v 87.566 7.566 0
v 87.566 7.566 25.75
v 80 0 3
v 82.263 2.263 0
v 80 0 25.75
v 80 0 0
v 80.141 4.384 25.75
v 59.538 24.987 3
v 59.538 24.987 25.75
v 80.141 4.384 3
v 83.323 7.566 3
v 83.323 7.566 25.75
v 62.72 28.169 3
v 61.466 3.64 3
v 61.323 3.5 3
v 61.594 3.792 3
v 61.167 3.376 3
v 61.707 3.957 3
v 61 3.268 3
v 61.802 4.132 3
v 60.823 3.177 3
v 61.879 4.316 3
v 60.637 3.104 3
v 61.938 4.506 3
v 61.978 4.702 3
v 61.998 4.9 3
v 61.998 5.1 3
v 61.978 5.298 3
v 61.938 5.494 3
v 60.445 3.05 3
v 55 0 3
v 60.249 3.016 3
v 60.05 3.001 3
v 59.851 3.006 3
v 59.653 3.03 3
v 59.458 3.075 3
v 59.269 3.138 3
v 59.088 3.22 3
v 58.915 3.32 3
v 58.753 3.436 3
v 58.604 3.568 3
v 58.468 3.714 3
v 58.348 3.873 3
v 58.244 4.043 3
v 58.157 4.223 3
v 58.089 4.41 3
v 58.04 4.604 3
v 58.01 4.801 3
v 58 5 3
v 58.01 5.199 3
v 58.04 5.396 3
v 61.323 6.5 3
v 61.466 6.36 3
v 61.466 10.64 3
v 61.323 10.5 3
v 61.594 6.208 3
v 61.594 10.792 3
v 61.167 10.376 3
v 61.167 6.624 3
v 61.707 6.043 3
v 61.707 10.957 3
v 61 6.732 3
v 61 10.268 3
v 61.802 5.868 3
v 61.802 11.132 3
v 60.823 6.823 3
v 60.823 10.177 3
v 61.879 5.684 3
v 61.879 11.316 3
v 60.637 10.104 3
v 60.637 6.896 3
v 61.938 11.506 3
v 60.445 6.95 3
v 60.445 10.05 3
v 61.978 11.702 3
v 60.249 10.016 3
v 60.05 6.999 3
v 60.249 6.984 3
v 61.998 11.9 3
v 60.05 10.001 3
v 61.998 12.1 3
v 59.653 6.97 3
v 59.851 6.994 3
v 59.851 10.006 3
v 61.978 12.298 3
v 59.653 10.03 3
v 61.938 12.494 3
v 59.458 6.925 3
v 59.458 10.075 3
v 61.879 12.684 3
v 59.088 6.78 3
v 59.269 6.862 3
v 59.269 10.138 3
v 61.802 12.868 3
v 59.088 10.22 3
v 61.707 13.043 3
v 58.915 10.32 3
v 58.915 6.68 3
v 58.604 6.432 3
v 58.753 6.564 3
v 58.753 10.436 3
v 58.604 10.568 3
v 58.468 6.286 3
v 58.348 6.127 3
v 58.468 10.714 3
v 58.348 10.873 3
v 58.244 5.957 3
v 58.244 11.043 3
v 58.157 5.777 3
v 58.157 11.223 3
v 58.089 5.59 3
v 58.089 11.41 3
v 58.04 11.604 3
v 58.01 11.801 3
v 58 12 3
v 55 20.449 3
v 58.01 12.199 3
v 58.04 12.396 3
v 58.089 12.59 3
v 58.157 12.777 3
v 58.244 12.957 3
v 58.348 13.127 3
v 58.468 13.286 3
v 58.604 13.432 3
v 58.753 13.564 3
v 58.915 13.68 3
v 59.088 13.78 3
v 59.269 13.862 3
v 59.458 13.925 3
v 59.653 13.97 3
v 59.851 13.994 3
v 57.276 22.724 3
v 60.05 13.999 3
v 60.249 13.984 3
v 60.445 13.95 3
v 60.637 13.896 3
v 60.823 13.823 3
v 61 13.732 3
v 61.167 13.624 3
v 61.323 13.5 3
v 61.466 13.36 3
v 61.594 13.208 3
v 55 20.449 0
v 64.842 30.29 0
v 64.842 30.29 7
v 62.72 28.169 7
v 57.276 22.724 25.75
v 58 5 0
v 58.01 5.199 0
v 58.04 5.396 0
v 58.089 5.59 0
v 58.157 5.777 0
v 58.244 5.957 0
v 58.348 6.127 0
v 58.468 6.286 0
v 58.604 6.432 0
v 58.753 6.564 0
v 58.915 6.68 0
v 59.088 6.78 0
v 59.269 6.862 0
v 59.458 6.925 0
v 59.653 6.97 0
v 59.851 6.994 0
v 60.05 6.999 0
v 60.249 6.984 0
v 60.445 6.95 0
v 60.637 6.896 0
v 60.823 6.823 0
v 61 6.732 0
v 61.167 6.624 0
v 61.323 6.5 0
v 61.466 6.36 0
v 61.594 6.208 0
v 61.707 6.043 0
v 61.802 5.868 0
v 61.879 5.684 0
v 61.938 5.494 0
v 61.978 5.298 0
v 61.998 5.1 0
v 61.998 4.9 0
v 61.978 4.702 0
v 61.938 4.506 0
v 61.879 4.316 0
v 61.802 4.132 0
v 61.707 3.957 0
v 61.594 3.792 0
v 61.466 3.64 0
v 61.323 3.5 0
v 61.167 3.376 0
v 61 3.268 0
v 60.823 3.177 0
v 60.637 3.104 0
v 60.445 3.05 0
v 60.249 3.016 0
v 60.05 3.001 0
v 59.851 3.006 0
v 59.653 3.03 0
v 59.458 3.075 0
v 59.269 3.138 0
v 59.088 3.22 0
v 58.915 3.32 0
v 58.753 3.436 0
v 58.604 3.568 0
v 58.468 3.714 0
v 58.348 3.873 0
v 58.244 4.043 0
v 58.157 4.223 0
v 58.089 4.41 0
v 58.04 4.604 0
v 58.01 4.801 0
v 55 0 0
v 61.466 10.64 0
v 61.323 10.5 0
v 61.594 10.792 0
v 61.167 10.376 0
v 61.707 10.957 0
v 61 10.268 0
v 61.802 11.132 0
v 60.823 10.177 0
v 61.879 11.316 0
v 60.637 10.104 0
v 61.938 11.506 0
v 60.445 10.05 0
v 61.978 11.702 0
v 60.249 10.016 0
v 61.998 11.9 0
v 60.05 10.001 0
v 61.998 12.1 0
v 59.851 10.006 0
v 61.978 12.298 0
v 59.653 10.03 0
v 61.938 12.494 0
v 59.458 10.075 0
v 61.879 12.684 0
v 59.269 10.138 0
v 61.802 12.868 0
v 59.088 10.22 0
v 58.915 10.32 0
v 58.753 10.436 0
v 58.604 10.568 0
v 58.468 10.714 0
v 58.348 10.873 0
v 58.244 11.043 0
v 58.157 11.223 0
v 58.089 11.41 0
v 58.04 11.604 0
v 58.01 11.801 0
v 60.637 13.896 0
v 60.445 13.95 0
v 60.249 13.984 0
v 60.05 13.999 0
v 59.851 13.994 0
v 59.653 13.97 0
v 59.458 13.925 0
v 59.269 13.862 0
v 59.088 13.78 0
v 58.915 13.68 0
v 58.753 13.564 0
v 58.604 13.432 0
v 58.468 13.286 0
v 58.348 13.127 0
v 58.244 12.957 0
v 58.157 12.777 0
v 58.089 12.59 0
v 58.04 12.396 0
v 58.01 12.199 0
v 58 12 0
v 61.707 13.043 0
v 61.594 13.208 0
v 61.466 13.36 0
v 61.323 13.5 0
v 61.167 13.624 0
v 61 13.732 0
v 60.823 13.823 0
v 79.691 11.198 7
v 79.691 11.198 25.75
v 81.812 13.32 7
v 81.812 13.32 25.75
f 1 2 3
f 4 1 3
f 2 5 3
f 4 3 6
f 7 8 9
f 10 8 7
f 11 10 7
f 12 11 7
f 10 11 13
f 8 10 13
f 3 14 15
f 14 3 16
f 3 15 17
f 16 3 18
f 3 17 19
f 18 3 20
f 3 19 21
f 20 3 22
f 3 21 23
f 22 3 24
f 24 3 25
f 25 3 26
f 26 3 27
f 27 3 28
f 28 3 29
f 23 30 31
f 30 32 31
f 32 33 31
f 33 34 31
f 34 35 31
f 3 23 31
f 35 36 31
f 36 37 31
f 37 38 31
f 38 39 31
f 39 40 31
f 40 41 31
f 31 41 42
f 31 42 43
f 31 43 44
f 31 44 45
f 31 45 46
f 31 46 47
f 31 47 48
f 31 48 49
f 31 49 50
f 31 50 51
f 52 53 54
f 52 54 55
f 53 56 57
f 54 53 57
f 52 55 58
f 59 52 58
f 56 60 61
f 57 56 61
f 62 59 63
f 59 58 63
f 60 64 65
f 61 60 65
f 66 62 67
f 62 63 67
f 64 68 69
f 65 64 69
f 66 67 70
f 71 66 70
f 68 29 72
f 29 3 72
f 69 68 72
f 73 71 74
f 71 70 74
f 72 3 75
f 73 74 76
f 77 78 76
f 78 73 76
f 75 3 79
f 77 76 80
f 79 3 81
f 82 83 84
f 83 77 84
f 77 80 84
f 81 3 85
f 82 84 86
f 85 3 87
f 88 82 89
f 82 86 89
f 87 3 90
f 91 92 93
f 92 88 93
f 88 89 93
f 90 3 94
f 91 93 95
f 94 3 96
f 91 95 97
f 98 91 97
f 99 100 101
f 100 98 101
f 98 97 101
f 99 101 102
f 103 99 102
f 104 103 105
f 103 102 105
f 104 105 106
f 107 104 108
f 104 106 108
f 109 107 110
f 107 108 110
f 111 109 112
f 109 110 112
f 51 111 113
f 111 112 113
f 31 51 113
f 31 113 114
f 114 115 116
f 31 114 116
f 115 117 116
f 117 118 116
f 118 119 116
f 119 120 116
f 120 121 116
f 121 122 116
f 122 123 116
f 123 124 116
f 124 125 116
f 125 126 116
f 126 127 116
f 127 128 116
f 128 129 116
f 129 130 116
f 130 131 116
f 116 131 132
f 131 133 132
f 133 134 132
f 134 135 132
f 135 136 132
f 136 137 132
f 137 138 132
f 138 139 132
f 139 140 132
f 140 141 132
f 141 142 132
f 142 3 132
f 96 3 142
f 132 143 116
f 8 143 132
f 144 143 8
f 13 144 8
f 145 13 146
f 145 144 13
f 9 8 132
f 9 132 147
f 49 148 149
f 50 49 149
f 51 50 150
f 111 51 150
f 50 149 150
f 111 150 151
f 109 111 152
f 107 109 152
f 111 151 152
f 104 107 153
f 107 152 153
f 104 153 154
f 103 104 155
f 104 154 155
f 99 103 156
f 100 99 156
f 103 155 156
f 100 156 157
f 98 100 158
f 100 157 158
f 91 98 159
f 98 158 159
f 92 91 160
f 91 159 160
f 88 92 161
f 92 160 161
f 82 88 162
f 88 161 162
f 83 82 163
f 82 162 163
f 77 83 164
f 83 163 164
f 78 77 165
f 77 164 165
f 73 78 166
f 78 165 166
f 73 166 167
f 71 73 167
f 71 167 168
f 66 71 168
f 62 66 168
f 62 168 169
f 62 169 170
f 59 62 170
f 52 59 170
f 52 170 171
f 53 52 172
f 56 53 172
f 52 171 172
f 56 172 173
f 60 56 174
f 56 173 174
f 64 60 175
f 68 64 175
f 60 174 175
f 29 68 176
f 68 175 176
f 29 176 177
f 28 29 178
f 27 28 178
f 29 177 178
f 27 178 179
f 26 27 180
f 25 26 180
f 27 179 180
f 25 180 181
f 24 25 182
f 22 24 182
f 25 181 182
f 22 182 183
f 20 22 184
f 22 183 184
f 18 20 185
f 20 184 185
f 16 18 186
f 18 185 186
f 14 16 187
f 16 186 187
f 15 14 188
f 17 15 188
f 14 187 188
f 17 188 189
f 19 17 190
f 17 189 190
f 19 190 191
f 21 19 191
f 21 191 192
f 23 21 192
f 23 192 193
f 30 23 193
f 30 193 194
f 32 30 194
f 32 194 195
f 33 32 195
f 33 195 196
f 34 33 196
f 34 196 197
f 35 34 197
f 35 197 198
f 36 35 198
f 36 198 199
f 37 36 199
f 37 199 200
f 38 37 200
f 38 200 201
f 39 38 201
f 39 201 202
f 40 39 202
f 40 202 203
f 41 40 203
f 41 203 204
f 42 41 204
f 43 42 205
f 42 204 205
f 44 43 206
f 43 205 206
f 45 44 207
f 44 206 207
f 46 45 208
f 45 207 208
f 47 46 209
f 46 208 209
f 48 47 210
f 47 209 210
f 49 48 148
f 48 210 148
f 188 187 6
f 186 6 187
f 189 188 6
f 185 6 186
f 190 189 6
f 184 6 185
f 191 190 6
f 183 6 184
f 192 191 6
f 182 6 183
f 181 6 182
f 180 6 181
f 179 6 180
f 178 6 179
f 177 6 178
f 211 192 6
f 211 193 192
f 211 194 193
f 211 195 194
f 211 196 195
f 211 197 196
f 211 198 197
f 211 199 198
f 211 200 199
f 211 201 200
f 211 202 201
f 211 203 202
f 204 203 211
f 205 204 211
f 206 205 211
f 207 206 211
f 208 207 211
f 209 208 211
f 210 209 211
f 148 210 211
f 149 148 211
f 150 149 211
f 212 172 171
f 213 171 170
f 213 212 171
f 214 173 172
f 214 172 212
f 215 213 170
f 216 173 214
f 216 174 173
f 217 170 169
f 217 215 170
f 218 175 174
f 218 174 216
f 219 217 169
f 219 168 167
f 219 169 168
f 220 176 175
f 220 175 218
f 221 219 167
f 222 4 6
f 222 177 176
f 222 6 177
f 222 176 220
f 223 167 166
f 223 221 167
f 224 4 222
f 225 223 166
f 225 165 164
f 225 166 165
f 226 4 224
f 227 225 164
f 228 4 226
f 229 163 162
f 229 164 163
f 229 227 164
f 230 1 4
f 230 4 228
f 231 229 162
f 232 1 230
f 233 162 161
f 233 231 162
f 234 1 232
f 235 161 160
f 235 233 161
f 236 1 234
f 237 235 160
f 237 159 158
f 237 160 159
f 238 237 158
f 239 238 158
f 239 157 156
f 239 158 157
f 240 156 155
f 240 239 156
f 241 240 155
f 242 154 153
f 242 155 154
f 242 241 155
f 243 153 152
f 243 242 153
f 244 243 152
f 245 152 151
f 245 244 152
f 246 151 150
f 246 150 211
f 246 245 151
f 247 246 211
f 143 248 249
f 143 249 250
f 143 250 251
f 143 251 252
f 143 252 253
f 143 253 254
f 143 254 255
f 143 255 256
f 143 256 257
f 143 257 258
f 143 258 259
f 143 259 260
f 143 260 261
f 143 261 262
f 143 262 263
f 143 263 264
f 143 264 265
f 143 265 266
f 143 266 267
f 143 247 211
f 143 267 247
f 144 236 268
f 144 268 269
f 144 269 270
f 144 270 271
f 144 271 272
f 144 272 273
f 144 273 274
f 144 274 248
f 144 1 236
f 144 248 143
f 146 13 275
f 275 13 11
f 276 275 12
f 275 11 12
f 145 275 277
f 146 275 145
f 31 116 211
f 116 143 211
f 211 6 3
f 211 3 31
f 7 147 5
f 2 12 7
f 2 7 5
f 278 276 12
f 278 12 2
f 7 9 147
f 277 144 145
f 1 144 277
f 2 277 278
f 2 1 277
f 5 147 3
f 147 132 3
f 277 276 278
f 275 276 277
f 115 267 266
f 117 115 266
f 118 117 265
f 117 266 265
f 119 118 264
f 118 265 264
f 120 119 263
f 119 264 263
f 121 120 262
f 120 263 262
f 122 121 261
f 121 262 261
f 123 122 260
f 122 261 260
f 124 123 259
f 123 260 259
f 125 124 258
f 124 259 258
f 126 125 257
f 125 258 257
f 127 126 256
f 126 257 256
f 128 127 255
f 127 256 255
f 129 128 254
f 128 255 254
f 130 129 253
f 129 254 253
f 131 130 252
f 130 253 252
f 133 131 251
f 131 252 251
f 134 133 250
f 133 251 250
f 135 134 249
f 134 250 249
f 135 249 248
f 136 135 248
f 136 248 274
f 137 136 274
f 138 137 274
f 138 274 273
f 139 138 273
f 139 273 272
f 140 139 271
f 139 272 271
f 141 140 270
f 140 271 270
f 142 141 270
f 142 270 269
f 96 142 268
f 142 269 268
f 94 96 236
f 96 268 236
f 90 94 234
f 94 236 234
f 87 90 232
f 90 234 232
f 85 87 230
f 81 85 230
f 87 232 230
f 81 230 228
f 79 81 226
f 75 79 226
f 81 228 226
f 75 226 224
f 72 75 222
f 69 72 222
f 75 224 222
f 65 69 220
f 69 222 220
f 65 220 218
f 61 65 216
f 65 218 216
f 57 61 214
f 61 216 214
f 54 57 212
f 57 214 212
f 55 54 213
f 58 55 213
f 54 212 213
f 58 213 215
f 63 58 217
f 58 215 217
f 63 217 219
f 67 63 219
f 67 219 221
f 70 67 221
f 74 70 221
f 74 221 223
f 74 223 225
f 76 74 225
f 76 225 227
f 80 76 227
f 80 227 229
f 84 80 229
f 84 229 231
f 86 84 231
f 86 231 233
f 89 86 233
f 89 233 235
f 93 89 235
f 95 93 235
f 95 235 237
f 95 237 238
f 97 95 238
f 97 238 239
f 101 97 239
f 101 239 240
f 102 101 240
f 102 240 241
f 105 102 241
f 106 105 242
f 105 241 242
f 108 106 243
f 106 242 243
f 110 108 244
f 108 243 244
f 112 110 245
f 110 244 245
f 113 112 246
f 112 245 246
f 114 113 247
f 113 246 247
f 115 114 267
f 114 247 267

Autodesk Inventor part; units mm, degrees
ref_plane "YZ Plane" through (0, 0, 0) normal (1, 0, 0) x (0, 1, 0)
ref_plane "XZ Plane" through (0, 0, 0) normal (0, 1, 0) x (-1, 0, 0)
ref_plane "XY Plane" through (0, 0, 0) normal (0, 0, 1) x (1, 0, 0)
sketch "Эскиз1" plane through (0, 0, 0) normal (0, 0, 1) x (1, 0, 0)
  line L0 (0, 80) -> (80, 0)
  line L1 (2.2627, 82.2627) -> (82.2627, 2.2627)
  line L2 (0, 80) -> (2.2627, 82.2627)
  line L3 (80, 0) -> (82.2627, 2.2627)
  point P0 (0, 0)
  dimension "d2" = 3.2
extrude "Выдавливание1" add sketch "Эскиз1" along normal blind 38.75
sketch "Эскиз2" plane through (0, 0, 0) normal (0, 0, -1) x (-1, 0, 0)
  line L0 (0, 80) -> (-80, 0) projected
  line L1 (-55, 25) -> (-55, -25)
  line L2 (-80, 0) -> (-55, 0)
  line L3 (-55, 8) -> (-60, 8)
  line L4 (-60, 8) -> (-60, 33)
  circle A0 centre (-60, 12) radius 2
  circle A1 centre (-60, 5) radius 2
  point P0 (0, 0)
  dimension "d5" = 4
extrude "Выдавливание2" add sketch "Эскиз2" against normal blind 3 contours L1 L3 L4 A0 L0 | L4 A0 L3 L1 L2 L0
sketch "Эскиз3" plane through (2.2627, 82.2627, 0) normal (0.7071068, 0.7071068, 0) x (-0.7071068, 0.7071068, 0)
  line L0 (-113.1371, 0) -> (-95.4594, 0) projected
  line L1 (0, 38.75) -> (-113.1371, 38.75) projected
  line L2 (-113.1371, 0) -> (-110.1371, 0)
  line L3 (-110.1371, 0) -> (-110.1371, 38.75)
  line L4 (-110.1371, 38.75) -> (-113.1371, 38.75)
  line L5 (-113.1371, 38.75) -> (-113.1371, 0)
  point P0 (-56.5685, 0)
  point P1 (-113.1371, 38.75)
  dimension "d8" = 3
extrude "Выдавливание3" add sketch "Эскиз3" along normal blind 4.5
sketch "Эскиз4" plane through (5.4447, 85.4447, 0) normal (0.7071068, 0.7071068, 0) x (0, 0, 1)
  line L0 (0, 113.1371) -> (3, 113.1371) projected
  line L1 (0, 0) -> (38.75, 0) projected
  line L2 (0, 113.1371) -> (7, 113.1371)
  line L3 (7, 113.1371) -> (7, 0)
  line L4 (7, 0) -> (0, 0)
  line L5 (0, 0) -> (0, 113.1371)
  line L6 (38.75, 0) -> (38.75, 113.1371) projected
  line L7 (7, 113.1371) -> (38.75, 113.1371)
  line L8 (38.75, 113.1371) -> (38.75, 105)
  line L9 (38.75, 105) -> (7, 105)
  line L10 (7, 105) -> (7, 113.1371)
  point P0 (0, 56.5685)
  point P1 (38.75, 113.1371)
  point P2 (7, 105)
extrude "Выдавливание4" add sketch "Эскиз4" along normal blind 3 contours L0 L2 L3 L1 L5 | L7 L6 L9 L3
sketch "Эскиз5" plane through (0, 0, 0) normal (0, 0, -1) x (-1, 0, 0)
  line L0 (-80.1414, 4.3841) -> (-2.2627, 82.2627) projected
  circle A0 centre (-60, 12) radius 2 projected
  circle A1 centre (-60, 5) radius 2 projected
  line L1 (0, 80) -> (-55, 25) projected
  line L2 (-2.2627, 82.2627) -> (0, 80) projected
  line L3 (-80.1414, 4.3841) -> (-2.2627, 82.2627) projected
  line L4 (-80.1414, 4.3841) -> (-83.3234, 7.566) projected
  line L5 (-83.3234, 7.566) -> (-5.4447, 85.4447) projected
  line L6 (-5.4447, 85.4447) -> (-7.566, 87.566) projected
  line L7 (-87.566, 7.566) -> (-7.566, 87.566) projected
  line L8 (-80, 0) -> (-87.566, 7.566) projected
  line L9 (-80, 0) -> (-55, 0) projected
  line L10 (-55, 0) -> (-55, 25) projected
  line L11 (-5.4447, 85.4447) -> (-2.2627, 82.2627)
  line L12 (-83.3234, 7.566) -> (-5.4447, 85.4447) projected
  point P0 (0, 0)
  point P1 (-2.2627, 82.2627)
extrude "Выдавливание5" add sketch "Эскиз5" against normal blind 3 contours L4 L5 L11 L0
sketch "Эскиз6" plane through (7.566, 87.566, 0) normal (0.7071068, 0.7071068, 0) x (-0.7071068, 0.7071068, 0)
  line L0 (0, 0) -> (-77.7817, 0) projected
  line L1 (-110.1371, 38.75) -> (0, 38.75) projected
  line L2 (0, 0) -> (-70, 0)
  line L3 (-70, 0) -> (-70, 38.75)
  line L4 (-70, 38.75) -> (0, 38.75)
  line L5 (0, 38.75) -> (0, 0)
  line L6 (-81, 0) -> (-81, 51)
  line L7 (-113.1371, 0) -> (0, 0) projected
  point P0 (-56.5685, 0)
  point P1 (0, 38.75)
  point P2 (-81, 38.75)
extrude "Выдавливание6" cut sketch "Эскиз6" against normal through all
sketch "Эскиз7" plane through (0, 0, 38.75) normal (0, 0, 1) x (1, 0, 0)
  line L0 (59.5384, 24.9871) -> (57.2756, 22.7244) projected
  line L1 (57.2756, 22.7244) -> (80, 0) projected
  line L2 (80, 0) -> (87.566, 7.566) projected
  line L3 (81.8123, 13.3198) -> (87.566, 7.566) projected
  line L4 (79.6909, 11.1985) -> (81.8123, 13.3198) projected
  line L5 (79.6909, 11.1985) -> (83.3234, 7.566) projected
  line L6 (80.1414, 4.3841) -> (83.3234, 7.566) projected
  line L7 (80.1414, 4.3841) -> (59.5384, 24.9871) projected
  point P0 (0, 0)
extrude "Выдавливание7" cut sketch "Эскиз7" against normal blind 13
properties part number "фанера"
